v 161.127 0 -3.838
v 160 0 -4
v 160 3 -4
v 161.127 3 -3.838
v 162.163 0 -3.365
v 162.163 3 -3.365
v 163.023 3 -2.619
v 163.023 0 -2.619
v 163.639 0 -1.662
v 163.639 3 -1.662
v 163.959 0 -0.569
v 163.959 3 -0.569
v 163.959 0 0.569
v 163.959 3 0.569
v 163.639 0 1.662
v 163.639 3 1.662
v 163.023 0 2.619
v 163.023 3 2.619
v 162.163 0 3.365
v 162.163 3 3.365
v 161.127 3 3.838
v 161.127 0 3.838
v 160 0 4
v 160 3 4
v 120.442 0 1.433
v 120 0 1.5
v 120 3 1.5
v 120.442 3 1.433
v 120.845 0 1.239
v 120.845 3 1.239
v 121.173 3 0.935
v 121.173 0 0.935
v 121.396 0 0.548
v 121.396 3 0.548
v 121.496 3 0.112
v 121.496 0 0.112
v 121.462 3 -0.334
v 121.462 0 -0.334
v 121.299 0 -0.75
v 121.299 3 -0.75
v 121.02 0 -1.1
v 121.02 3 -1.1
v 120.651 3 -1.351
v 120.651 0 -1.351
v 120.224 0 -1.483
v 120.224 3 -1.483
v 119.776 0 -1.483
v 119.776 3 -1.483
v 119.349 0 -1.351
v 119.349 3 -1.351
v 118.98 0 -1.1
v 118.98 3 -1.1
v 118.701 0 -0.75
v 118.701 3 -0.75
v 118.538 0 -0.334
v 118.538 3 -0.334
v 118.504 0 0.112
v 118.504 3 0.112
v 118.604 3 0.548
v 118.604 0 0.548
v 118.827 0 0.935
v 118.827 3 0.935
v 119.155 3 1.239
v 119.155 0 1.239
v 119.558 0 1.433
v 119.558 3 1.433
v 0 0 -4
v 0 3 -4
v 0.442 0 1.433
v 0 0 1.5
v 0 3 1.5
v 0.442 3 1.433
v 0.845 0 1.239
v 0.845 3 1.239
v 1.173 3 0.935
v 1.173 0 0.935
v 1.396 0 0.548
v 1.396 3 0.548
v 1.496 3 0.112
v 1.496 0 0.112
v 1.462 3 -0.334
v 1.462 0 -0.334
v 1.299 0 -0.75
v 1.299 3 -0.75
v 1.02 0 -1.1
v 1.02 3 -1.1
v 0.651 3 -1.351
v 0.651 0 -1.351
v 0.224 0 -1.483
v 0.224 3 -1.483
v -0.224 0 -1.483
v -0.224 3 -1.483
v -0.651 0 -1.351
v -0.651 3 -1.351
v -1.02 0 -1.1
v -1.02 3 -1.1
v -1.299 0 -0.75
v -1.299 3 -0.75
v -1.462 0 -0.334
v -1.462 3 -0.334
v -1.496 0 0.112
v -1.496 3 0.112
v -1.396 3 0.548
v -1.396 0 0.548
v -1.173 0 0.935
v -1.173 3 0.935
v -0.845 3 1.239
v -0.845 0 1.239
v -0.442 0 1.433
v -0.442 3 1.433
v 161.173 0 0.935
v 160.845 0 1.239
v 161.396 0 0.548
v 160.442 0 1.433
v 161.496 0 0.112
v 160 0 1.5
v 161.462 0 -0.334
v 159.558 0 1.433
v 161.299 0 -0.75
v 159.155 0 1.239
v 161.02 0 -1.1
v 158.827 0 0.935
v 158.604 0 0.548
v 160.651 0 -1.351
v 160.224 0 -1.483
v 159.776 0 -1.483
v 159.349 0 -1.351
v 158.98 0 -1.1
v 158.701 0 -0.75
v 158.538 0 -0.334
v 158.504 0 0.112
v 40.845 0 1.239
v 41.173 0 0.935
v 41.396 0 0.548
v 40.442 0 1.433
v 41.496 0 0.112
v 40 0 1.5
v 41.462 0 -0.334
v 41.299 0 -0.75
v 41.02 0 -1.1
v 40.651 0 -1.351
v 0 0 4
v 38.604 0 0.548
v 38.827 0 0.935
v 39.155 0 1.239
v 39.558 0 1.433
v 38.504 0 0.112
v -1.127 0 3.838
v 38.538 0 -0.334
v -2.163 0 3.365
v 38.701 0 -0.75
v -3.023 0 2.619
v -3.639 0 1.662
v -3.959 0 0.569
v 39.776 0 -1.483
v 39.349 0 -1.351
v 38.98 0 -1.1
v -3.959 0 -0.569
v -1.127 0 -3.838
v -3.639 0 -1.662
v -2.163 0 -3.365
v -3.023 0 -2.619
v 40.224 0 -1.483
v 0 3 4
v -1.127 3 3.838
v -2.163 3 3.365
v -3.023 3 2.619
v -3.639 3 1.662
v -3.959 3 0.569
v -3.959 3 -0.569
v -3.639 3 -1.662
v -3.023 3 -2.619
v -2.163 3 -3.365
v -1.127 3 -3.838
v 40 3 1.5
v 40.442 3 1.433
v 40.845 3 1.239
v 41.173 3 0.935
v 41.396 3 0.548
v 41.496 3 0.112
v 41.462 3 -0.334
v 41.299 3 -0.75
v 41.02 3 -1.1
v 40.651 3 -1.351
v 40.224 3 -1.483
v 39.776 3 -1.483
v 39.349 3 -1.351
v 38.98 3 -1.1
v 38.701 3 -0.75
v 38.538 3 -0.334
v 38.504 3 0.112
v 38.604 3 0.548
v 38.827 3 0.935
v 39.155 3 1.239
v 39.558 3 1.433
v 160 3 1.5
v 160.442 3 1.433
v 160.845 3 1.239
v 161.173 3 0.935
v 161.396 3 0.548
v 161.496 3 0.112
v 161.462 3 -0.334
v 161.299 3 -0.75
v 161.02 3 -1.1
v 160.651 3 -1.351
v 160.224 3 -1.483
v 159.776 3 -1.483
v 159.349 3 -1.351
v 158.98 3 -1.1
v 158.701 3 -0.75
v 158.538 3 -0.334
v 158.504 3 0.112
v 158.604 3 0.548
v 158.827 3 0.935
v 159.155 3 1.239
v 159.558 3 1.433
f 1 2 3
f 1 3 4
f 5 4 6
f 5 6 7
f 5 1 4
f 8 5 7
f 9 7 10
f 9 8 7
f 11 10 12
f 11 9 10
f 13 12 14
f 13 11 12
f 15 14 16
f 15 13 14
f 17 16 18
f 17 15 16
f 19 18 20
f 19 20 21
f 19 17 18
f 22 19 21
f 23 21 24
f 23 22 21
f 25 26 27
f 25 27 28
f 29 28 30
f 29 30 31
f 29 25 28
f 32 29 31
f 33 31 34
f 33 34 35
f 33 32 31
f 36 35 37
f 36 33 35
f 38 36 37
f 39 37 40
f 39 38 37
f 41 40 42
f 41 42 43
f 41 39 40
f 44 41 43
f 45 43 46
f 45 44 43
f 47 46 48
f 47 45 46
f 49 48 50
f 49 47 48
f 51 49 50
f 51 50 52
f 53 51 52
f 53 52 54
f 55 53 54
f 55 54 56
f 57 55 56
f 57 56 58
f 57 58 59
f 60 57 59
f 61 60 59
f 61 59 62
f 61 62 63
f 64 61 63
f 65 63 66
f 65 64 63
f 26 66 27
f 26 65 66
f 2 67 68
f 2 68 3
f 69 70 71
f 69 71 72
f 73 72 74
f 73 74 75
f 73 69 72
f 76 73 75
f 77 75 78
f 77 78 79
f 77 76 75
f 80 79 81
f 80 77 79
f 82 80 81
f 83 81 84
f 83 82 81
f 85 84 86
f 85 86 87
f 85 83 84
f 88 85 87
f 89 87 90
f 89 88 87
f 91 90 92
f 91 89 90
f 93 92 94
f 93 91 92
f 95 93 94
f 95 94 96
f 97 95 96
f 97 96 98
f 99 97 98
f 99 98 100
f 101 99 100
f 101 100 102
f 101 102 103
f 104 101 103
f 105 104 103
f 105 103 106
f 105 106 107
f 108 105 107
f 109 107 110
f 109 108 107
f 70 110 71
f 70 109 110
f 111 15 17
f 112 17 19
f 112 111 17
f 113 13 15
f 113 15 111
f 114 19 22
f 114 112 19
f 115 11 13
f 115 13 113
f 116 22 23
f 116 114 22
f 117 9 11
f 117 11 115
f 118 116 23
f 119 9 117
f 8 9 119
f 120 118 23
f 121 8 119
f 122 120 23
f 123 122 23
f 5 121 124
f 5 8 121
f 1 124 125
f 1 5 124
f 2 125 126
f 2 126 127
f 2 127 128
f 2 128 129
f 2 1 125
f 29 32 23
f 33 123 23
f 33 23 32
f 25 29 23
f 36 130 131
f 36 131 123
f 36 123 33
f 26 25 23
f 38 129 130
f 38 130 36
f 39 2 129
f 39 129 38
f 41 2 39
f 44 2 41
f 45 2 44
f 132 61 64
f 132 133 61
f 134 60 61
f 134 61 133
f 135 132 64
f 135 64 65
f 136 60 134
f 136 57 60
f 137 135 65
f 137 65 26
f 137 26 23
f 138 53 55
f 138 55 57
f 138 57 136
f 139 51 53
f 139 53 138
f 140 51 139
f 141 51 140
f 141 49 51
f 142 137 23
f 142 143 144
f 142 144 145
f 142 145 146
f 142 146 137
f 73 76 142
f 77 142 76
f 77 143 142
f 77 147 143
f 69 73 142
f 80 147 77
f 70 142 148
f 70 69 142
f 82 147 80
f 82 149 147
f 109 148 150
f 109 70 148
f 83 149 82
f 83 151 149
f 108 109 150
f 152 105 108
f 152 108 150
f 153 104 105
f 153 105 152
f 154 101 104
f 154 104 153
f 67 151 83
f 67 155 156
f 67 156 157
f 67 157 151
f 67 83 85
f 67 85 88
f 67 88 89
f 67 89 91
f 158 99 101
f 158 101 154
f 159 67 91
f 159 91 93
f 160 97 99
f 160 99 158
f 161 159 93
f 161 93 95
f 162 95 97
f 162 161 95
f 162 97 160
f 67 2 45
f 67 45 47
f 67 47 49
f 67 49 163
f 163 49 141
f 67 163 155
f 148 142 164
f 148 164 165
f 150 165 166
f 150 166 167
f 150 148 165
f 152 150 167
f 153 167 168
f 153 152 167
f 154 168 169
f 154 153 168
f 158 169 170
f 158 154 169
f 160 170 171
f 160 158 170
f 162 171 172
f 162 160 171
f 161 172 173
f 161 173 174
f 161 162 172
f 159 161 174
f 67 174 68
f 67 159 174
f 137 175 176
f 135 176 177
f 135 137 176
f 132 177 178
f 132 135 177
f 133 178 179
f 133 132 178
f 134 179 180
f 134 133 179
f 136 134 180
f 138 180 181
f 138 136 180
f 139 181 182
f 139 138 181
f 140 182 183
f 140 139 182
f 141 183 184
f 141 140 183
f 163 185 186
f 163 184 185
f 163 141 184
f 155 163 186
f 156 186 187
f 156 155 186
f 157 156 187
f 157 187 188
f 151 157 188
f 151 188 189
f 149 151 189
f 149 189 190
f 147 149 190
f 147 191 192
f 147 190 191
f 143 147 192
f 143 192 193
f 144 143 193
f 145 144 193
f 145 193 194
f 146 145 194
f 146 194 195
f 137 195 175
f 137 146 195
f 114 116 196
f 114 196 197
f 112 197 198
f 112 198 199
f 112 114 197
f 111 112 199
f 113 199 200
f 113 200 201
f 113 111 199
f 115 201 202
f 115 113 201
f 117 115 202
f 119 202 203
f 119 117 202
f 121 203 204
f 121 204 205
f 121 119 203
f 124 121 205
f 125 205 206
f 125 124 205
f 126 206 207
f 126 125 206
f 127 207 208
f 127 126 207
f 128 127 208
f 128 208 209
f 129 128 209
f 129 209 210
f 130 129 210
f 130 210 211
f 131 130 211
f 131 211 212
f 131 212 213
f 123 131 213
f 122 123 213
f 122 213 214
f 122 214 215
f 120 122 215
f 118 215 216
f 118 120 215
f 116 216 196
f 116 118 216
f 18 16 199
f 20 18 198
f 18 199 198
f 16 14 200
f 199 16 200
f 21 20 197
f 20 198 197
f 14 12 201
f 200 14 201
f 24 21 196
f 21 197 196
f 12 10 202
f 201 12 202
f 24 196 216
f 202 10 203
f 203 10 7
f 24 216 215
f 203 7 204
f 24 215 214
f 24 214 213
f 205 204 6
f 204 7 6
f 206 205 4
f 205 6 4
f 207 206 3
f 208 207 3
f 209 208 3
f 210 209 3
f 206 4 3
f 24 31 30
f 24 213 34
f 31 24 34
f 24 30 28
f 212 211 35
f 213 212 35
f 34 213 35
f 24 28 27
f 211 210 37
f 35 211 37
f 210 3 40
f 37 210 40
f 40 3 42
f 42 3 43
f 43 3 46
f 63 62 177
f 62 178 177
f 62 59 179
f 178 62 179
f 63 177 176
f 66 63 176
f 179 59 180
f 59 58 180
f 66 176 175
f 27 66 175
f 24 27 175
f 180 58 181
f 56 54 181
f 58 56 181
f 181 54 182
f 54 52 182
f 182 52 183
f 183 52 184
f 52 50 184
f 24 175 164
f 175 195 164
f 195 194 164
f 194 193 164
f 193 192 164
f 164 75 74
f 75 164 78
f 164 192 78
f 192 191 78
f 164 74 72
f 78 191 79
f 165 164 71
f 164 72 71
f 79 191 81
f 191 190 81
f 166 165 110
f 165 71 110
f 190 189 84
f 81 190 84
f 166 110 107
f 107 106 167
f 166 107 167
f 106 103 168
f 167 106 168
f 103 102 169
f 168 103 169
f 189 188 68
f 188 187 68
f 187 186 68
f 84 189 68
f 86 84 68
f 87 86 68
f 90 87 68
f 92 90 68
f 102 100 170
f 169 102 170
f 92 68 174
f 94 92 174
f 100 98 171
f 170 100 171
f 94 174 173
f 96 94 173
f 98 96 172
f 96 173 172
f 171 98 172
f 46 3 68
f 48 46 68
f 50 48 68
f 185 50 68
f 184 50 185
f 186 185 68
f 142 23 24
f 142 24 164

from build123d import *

# Parameters (mm, degrees)
SKETCH1_R           = 1.5
BOSS_EXTRUDE1_DEPTH = 3
SKETCH4_R           = 1.5
CUT_EXTRUDE4_DEPTH  = 165.076201809


with BuildPart() as part:
    # Sketch1 → Boss-Extrude1 (new body)
    with BuildSketch(Plane(origin=(0, 0, 0), x_dir=(1, 0, 0), z_dir=(0, 1, 0))):
        with BuildLine():
            Line((0, 4), (160, 4))
            ThreePointArc((160, 4), (164, 0), (160, -4))
            Line((160, -4), (0, -4))
            ThreePointArc((0, -4), (-4, 0), (0, 4))
        make_face()
        with Locations(Location((0, 0, 0), (0, 0, 270))):
            Circle(SKETCH1_R, mode=Mode.SUBTRACT)
        with Locations(Location((160, 0, 0), (0, 0, 270))):
            Circle(SKETCH1_R, mode=Mode.SUBTRACT)
        with Locations(Location((120, 0, 0), (0, 0, 270))):
            Circle(SKETCH1_R, mode=Mode.SUBTRACT)
    extrude(amount=BOSS_EXTRUDE1_DEPTH)

    # Sketch4 → Cut-Extrude4 (cut, through all)
    with BuildSketch(Plane(origin=(0, 0, 0), x_dir=(1, 0, 0), z_dir=(0, 1, 0))):
        with Locations(Location((40, 0, 0), (0, 0, 270))):
            Circle(SKETCH4_R)
    extrude(amount=CUT_EXTRUDE4_DEPTH, mode=Mode.SUBTRACT)


solid = part.part
